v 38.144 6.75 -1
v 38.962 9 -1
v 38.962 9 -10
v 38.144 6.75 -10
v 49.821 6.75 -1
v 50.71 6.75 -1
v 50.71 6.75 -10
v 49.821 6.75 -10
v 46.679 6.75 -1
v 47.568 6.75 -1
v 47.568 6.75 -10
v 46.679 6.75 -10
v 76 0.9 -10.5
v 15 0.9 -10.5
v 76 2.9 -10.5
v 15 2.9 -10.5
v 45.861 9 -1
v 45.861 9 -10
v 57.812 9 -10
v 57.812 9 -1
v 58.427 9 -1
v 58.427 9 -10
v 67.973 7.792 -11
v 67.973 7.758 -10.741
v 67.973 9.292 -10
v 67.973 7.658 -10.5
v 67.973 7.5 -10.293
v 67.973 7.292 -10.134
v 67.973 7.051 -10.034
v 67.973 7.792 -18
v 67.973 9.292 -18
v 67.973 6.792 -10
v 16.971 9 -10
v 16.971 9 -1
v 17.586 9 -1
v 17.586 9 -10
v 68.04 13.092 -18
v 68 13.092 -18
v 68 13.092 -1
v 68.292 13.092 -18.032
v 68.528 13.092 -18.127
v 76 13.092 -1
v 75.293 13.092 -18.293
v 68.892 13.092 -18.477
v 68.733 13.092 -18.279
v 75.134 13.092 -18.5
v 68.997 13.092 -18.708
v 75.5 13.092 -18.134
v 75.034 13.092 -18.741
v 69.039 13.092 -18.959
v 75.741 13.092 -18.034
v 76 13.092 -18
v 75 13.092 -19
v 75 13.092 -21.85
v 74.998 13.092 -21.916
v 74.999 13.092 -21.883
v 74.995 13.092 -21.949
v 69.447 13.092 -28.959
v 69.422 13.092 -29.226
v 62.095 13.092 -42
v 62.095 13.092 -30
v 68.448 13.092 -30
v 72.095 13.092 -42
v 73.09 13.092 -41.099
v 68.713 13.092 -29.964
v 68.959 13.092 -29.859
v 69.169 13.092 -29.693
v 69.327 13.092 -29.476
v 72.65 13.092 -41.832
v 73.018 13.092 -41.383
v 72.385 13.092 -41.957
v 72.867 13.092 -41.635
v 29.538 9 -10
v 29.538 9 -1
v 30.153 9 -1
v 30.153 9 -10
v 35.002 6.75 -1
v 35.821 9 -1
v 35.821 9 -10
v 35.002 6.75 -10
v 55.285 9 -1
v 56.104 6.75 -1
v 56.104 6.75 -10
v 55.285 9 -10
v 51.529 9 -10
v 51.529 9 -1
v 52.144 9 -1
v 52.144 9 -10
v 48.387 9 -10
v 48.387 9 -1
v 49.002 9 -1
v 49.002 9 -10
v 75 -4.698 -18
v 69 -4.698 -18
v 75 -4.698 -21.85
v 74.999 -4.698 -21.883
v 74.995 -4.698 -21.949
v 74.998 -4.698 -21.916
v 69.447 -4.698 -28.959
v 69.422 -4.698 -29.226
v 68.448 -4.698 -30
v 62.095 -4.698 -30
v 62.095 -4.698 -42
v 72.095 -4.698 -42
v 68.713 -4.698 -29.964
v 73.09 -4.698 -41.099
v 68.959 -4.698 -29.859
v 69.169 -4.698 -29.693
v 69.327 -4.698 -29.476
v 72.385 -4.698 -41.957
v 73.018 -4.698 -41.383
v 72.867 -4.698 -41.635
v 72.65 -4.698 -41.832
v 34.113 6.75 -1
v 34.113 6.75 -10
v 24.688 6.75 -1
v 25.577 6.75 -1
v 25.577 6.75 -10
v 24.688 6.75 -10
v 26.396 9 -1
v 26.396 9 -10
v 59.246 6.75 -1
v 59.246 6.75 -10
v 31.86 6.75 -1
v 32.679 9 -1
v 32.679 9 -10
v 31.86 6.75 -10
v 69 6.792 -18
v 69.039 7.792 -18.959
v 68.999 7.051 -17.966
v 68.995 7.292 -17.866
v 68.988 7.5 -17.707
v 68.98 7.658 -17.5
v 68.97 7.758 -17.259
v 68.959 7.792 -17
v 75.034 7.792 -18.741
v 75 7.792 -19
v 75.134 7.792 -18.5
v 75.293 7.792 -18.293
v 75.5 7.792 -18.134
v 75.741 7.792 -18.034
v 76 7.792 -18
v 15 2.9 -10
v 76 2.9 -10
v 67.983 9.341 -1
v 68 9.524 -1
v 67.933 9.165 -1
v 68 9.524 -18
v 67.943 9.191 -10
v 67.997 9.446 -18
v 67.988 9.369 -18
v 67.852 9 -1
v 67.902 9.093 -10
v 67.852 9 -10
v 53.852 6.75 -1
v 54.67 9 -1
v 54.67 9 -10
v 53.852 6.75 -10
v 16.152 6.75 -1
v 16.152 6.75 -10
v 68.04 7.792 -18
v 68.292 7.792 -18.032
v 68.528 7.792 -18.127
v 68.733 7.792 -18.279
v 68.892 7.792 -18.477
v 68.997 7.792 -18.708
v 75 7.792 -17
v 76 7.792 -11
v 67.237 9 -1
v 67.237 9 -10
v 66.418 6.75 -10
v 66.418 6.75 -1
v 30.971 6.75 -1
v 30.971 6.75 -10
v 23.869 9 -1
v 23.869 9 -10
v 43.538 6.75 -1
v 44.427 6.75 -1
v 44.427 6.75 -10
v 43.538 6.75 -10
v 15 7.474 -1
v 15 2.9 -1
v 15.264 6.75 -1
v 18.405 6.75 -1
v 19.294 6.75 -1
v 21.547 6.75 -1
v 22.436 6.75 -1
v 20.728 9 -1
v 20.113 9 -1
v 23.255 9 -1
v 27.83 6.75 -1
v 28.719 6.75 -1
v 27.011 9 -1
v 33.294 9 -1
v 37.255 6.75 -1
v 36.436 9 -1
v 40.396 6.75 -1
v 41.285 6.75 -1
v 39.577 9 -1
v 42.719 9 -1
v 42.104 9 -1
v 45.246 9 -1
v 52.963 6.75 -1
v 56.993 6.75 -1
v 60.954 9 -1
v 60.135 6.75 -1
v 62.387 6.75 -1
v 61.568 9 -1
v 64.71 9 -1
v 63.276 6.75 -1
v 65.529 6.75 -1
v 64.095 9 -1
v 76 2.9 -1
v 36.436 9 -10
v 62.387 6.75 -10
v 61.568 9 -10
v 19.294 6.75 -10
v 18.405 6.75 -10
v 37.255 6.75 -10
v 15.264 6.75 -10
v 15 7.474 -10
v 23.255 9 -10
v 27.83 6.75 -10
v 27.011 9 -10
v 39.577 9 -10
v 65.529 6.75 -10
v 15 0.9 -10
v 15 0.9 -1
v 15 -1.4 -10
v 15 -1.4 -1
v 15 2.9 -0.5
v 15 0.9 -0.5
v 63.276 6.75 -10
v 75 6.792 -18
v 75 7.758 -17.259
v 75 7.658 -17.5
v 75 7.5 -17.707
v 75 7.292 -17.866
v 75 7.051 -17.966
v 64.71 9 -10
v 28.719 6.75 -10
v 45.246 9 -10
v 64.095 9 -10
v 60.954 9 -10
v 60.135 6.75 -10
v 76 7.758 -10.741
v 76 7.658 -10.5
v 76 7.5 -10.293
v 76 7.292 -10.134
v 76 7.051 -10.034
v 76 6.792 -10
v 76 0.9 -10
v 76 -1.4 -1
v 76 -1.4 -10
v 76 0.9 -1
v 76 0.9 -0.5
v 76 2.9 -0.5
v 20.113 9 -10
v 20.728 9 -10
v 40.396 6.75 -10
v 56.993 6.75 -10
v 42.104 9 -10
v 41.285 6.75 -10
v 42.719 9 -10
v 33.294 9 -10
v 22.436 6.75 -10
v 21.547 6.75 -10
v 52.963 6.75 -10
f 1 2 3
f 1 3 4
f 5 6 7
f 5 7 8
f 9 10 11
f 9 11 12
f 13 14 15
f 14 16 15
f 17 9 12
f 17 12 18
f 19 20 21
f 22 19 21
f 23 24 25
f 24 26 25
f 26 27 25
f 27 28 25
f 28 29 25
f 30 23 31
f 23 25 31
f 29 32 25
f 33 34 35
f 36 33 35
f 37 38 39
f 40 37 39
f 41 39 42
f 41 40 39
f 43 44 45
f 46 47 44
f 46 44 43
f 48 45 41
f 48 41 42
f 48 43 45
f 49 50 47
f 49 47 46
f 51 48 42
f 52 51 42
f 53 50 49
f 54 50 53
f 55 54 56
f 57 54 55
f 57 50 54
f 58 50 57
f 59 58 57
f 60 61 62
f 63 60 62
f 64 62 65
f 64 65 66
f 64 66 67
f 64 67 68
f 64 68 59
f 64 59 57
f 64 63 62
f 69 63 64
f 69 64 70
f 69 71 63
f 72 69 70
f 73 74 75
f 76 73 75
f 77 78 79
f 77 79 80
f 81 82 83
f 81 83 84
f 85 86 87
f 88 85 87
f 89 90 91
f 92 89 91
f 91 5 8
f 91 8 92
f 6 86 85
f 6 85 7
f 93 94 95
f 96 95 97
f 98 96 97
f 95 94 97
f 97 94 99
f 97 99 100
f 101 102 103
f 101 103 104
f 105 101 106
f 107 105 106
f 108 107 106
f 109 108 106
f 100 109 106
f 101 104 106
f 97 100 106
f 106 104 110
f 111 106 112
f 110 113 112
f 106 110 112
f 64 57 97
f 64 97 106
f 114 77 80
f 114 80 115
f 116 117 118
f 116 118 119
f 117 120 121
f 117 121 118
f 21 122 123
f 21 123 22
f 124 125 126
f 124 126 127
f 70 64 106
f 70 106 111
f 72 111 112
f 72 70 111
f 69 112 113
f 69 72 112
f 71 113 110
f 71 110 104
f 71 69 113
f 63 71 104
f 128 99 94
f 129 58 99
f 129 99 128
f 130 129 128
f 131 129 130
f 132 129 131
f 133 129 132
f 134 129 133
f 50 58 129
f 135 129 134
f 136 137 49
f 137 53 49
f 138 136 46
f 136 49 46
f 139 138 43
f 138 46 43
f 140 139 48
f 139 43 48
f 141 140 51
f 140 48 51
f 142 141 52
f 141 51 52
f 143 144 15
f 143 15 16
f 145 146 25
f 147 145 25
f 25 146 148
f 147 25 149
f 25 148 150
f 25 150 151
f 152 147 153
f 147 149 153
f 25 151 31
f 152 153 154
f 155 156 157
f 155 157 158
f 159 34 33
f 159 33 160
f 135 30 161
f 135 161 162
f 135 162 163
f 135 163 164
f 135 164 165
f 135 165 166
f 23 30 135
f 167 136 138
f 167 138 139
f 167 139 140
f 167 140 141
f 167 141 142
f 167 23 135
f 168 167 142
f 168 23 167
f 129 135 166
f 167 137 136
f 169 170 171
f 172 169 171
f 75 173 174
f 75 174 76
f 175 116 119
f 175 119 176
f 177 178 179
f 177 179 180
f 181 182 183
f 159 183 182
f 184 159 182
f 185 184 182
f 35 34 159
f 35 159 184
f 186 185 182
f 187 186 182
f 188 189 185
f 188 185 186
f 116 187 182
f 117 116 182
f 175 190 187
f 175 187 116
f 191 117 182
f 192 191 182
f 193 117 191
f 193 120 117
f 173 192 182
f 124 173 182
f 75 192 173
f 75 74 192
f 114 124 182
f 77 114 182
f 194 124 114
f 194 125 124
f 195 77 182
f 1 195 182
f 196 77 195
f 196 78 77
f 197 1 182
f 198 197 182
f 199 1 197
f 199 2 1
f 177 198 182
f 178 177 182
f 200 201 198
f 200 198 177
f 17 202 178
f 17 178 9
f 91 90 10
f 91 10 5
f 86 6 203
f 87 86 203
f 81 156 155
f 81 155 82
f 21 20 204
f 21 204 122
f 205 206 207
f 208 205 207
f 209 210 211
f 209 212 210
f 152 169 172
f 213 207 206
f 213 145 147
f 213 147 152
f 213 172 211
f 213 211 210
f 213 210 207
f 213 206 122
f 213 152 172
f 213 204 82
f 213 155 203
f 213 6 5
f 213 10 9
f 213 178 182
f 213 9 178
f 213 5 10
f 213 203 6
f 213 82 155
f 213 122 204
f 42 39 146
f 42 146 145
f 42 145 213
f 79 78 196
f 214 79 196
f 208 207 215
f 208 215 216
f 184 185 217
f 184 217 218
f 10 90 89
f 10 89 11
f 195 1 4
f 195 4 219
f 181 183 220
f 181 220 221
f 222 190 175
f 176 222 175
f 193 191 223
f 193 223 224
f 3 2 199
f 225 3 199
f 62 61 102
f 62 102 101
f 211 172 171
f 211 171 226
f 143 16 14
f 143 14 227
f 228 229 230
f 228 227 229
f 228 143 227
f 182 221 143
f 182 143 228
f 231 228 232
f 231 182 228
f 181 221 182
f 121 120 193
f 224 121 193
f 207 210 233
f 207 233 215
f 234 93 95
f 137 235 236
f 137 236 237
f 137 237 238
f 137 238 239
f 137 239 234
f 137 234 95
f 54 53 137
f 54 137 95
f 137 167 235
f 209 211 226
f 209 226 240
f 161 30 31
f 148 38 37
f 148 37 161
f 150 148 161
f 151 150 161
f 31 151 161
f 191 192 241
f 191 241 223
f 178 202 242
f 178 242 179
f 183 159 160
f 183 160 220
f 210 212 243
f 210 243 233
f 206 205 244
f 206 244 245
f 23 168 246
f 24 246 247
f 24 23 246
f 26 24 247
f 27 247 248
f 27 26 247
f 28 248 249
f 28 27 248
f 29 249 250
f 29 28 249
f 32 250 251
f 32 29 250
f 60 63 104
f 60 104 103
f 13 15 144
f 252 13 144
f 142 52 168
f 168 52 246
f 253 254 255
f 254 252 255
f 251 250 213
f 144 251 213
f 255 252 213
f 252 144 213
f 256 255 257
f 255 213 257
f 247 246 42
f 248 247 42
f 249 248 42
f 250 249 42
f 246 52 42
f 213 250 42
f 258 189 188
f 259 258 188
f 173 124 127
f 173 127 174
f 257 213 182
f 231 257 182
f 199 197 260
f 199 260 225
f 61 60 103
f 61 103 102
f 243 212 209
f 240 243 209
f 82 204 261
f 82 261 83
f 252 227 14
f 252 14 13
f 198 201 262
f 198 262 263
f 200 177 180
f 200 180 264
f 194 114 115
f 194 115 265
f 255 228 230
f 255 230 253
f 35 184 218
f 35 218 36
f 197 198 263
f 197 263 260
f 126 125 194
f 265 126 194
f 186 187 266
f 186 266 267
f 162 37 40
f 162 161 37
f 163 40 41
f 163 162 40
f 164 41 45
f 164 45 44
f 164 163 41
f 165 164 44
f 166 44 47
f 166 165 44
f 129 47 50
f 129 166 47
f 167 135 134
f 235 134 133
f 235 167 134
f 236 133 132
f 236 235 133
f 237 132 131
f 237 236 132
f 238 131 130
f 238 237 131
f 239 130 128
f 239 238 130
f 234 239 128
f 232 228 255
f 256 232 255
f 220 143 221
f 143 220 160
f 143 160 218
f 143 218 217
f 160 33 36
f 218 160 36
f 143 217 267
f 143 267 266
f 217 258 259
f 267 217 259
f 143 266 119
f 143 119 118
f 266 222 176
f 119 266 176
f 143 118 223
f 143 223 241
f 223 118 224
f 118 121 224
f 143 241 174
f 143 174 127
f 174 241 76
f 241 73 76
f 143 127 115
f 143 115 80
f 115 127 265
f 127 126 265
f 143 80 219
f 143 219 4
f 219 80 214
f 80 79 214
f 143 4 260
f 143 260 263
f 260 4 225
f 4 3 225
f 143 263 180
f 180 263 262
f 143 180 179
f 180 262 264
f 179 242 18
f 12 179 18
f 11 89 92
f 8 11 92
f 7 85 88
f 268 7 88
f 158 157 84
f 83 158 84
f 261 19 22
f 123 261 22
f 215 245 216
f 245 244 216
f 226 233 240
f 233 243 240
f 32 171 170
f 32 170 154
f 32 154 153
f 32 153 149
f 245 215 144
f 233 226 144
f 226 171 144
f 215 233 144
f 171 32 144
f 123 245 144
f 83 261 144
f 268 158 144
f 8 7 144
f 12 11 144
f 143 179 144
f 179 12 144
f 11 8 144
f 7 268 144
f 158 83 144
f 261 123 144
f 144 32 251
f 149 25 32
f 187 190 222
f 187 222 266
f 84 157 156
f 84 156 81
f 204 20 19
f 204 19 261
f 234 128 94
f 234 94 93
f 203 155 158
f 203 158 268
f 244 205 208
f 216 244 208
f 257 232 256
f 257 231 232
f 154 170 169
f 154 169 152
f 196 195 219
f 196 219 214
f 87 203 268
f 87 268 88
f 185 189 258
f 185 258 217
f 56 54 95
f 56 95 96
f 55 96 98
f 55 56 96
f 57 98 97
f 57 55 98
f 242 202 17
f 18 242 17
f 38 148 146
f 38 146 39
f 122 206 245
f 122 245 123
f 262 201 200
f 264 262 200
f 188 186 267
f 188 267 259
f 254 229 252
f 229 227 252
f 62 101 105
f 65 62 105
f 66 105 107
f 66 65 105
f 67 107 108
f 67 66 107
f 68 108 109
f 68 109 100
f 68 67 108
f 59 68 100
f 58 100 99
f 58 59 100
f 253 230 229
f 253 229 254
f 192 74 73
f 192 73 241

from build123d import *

# Parameters (mm, degrees)
BLANKSKE_W           = 68
BLANKSKE_H           = 9
BLANK_DEPTH          = 10
TOOTHCUTSIM_DEPTH    = 70.318107302
TEETHCUTS_COUNT      = 23
TEETHCUTS_PITCH      = 3.14159265
SKETCH1_W            = 10
SKETCH1_H            = 8.592466409
BOSS_EXTRUDE1_DEPTH  = 8
SKETCH3_W            = 8
SKETCH3_H            = 10
BOSS_EXTRUDE2_DEPTH  = 4.5
SKETCH4_W            = 8
SKETCH4_H            = 3.8
BOSS_EXTRUDE3_DEPTH  = 8
SKETCH5_W            = 10
SKETCH5_H            = 11.170580006
CUT_EXTRUDE1_DEPTH   = 8
CUT_EXTRUDE2_DEPTH   = 1
BOSS_EXTRUDE5_DEPTH  = 0.5
FILLET8_START        = -10
FILLET8_DEPTH        = 9
FILLET8_START_2      = -18
FILLET8_2_DEPTH      = 8.45342
BOSS_EXTRUDE6_DEPTH  = 17.79
BOSS_EXTRUDE10_DEPTH = 1.5
FILLET15_R           = 1
SKETCH11_W           = 15.24537785
SKETCH11_H           = 13.543744844
CUT_EXTRUDE3_DEPTH   = 7
SKETCH16_W           = 61
SKETCH16_H           = 9
BOSS_EXTRUDE12_DEPTH = 1.4
FILLET19_R           = 1


with BuildPart() as part:
    # BlankSke → Blank (new body)
    with BuildSketch(Plane.XY):
        with Locations((34, 4.5)):
            Rectangle(BLANKSKE_W, BLANKSKE_H)
    extrude(amount=-BLANK_DEPTH)

    # TooCutSkeSim → ToothCutSim (cut, through all)
    with BuildSketch(Plane.XY):
        Polygon((0.44443537, 6.75), (-0.44443537, 6.75), (-1.272613241, 9.0254), (1.272613241, 9.0254), align=None)
    toothcutsim = extrude(amount=-TOOTHCUTSIM_DEPTH, mode=Mode.SUBTRACT)

    # TeethCuts: ToothCutSim ×23
    with Locations(*[(i * TEETHCUTS_PITCH, 0, 0) for i in range(1, TEETHCUTS_COUNT)]):
        add(toothcutsim, mode=Mode.SUBTRACT)

    # Sketch1 → Boss-Extrude1 (add)
    with BuildSketch(Plane(origin=(68, 0, 0), x_dir=(0, 0, -1), z_dir=(1, 0, 0))):
        with Locations((5, 4.296233205)):
            Rectangle(SKETCH1_W, SKETCH1_H)
    extrude(amount=BOSS_EXTRUDE1_DEPTH)

    # Sketch3 → Boss-Extrude2 (add)
    with BuildSketch(Plane(origin=(0, 8.592466409, 0), x_dir=(1, 0, 0), z_dir=(0, 1, 0))):
        with Locations((72, 5)):
            Rectangle(SKETCH3_W, SKETCH3_H)
    extrude(amount=BOSS_EXTRUDE2_DEPTH)

    # Sketch4 → Boss-Extrude3 (add)
    with BuildSketch(Plane(origin=(0, 0, -10), x_dir=(-1, 0, 0), z_dir=(0, 0, -1))):
        with Locations((-72, 11.192466409)):
            Rectangle(SKETCH4_W, SKETCH4_H)
    extrude(amount=BOSS_EXTRUDE3_DEPTH)

    # Sketch5 → Cut-Extrude1 (cut)
    with BuildSketch(Plane.ZY):
        with Locations((-5, 5.585290003)):
            Rectangle(SKETCH5_W, SKETCH5_H)
    extrude(amount=-CUT_EXTRUDE1_DEPTH, mode=Mode.SUBTRACT)

    # Sketch6 → Cut-Extrude2 (cut)
    with BuildSketch(Plane.XY):
        Polygon((8.161409553, 9), (8, 9), (8, 0), (76, 0), (76, 13.092466409), (68, 13.092466409), (68, 8.592466409), (67.851669903, 9), (67.236814047, 9), (66.41788102, 6.75), (65.52901028, 6.75), (64.710077253, 9), (64.095221397, 9), (63.27628837, 6.75), (62.38741763, 6.75), (61.568484603, 9), (60.953628747, 9), (60.13469572, 6.75), (59.24582498, 6.75), (58.426891953, 9), (57.812036097, 9), (56.99310307, 6.75), (56.10423233, 6.75), (55.285299303, 9), (54.670443447, 9), (53.85151042, 6.75), (52.96263968, 6.75), (52.143706653, 9), (51.528850797, 9), (50.70991777, 6.75), (49.82104703, 6.75), (49.002114003, 9), (48.387258147, 9), (47.56832512, 6.75), (46.67945438, 6.75), (45.860521353, 9), (45.245665497, 9), (44.42673247, 6.75), (43.53786173, 6.75), (42.718928703, 9), (42.104072847, 9), (41.28513982, 6.75), (40.39626908, 6.75), (39.577336053, 9), (38.962480197, 9), (38.14354717, 6.75), (37.25467643, 6.75), (36.435743403, 9), (35.820887547, 9), (35.00195452, 6.75), (34.11308378, 6.75), (33.294150753, 9), (32.679294897, 9), (31.86036187, 6.75), (30.97149113, 6.75), (30.152558103, 9), (29.537702247, 9), (28.71876922, 6.75), (27.82989848, 6.75), (27.010965453, 9), (26.396109597, 9), (25.57717657, 6.75), (24.68830583, 6.75), (23.869372803, 9), (23.254516947, 9), (22.43558392, 6.75), (21.54671318, 6.75), (20.727780153, 9), (20.112924297, 9), (19.29399127, 6.75), (18.40512053, 6.75), (17.586187503, 9), (16.971331647, 9), (16.15239862, 6.75), (15.26352788, 6.75), (14.444594853, 9), (13.829738997, 9), (13.01080597, 6.75), (12.12193523, 6.75), (11.303002203, 9), (10.688146347, 9), (9.86921332, 6.75), (8.98034258, 6.75), align=None)
    extrude(amount=-CUT_EXTRUDE2_DEPTH, mode=Mode.SUBTRACT)

    # Sketch7 → Boss-Extrude5 (add)
    with BuildSketch(Plane.XY.offset(-1)):
        Polygon((8.8, 0.9), (75.2, 0.9), (76, 0.9), (76, 2.9), (75.2, 2.9), (8.8, 2.9), (8, 2.9), (8, 0.9), align=None)
    boss_extrude5 = extrude(amount=BOSS_EXTRUDE5_DEPTH)

    # Mirror3: Boss-Extrude5 across plane
    add(boss_extrude5.mirror(Plane.XY.offset(-5.5)))

    # Fillet8: read off the stored shape, not the designer's step
    # Fillet8 outline → Fillet8 (add)
    with BuildSketch(Plane.XY.offset(FILLET8_START)):
        with BuildLine():
            ThreePointArc((68, 9.524078597), (67.962203176, 9.251745991), (67.851669903, 9))
            Line((67.851669903, 9), (68, 8.592466409))
            Line((68, 8.592466409), (68, 9.524078597))
        make_face()
    extrude(amount=FILLET8_DEPTH)

    # Fillet8 2 outline → Fillet8 2 (add)
    with BuildSketch(Plane.XY.offset(FILLET8_START_2)):
        with BuildLine():
            Line((68, 9.292466409), (68, 9.524078597))
            ThreePointArc((68, 9.524078597), (67.993178786, 9.407477139), (67.9728082, 9.292466409))
            Line((67.9728082, 9.292466409), (68, 9.292466409))
        make_face()
    extrude(amount=FILLET8_2_DEPTH)

    # Sketch8 → Boss-Extrude6 (add)
    with BuildSketch(Plane(origin=(0, 13.092466409, 0), x_dir=(1, 0, 0), z_dir=(0, 1, 0))):
        with BuildLine():
            Line((75, 18), (75, 21.850371294))
            ThreePointArc((75, 21.850371294), (74.998770766, 21.899938995), (74.995086086, 21.949384835))
            Line((74.995086086, 21.949384835), (73.089650394, 41.099013541))
            ThreePointArc((73.089650394, 41.099013541), (72.765752232, 41.741287239), (72.094564308, 42))
            Line((72.094564308, 42), (62.094564308, 42))
            Line((62.094564308, 42), (62.094564308, 30))
            Line((62.094564308, 30), (64.933441114, 30))
            Line((64.933441114, 30), (68.447653948, 30))
            ThreePointArc((68.447653948, 30), (69.169019838, 29.692554151), (69.446823832, 28.959262504))
            Line((69.446823832, 28.959262504), (69, 18))
            Line((69, 18), (75, 18))
        make_face()
    extrude(amount=-BOSS_EXTRUDE6_DEPTH)

    # Sketch14 → Boss-Extrude10 (add)
    with BuildSketch(Plane.XZ.offset(-9.292466409)):
        Polygon((76, -10), (67.9728082, -10), (67.9728082, -18), (69, -18), (75, -18), (76, -18), align=None)
    extrude(amount=BOSS_EXTRUDE10_DEPTH)

    # Fillet15
    fillet15_edges = [part.edges().sort_by_distance(p)[0] for p in [
        (71.9864041, 7.792466409, -10),
        (72, 7.792466409, -18),
    ]]
    fillet(fillet15_edges, radius=FILLET15_R)

    # Sketch11 → Cut-Extrude3 (cut)
    with BuildSketch(Plane.ZY.offset(-8)):
        with Locations((-5.226368624, 3.937583059)):
            Rectangle(SKETCH11_W, SKETCH11_H)
    extrude(amount=-CUT_EXTRUDE3_DEPTH, mode=Mode.SUBTRACT)

    # Sketch16 → Boss-Extrude12 (add)
    with BuildSketch(Plane.XZ):
        with Locations((45.5, -5.5)):
            Rectangle(SKETCH16_W, SKETCH16_H)
    extrude(amount=BOSS_EXTRUDE12_DEPTH)

    # Fillet19
    fillet19_edges = [part.edges().sort_by_distance(p)[0] for p in [
        (75, 10.442466409, -18),
        (69, 10.442466409, -18),
    ]]
    fillet(fillet19_edges, radius=FILLET19_R - 0.0001)  # a hair under: the kernel refuses the full size


solid = part.part
